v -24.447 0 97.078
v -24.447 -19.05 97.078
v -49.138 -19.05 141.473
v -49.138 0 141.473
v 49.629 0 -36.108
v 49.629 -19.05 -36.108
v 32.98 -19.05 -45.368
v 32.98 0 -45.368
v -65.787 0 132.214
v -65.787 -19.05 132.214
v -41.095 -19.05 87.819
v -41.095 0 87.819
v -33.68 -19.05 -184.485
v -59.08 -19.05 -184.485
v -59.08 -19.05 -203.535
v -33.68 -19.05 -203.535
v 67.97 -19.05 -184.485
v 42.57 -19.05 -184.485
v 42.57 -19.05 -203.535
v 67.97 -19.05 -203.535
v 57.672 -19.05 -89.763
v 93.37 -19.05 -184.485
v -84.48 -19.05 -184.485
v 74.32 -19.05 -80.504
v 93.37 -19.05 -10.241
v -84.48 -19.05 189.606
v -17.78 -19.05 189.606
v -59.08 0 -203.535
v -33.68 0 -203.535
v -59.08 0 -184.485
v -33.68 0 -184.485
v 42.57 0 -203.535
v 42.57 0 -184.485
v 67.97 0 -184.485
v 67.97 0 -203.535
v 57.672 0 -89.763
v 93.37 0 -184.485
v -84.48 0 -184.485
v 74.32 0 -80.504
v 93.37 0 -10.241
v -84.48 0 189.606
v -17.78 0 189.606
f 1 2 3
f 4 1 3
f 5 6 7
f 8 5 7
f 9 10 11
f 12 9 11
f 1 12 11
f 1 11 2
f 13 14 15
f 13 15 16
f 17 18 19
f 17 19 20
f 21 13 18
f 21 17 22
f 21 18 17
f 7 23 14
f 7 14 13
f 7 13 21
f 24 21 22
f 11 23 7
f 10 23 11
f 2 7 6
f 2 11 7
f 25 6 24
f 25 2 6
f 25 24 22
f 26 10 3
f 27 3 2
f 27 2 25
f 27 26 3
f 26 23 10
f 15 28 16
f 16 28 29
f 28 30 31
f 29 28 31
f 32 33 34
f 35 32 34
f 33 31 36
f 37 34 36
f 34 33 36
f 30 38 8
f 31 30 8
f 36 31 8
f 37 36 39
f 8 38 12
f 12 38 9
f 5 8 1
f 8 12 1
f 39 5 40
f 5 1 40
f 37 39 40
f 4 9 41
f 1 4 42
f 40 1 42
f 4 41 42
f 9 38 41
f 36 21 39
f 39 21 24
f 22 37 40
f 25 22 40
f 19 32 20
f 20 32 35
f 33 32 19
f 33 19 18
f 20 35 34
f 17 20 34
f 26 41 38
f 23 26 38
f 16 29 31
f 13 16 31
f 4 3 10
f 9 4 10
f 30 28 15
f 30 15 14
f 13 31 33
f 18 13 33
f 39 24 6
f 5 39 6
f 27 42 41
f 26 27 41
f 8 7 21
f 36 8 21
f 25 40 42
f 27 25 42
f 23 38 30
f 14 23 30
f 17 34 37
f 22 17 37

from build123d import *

# Parameters (mm, degrees)
F0_W     = 25.4
F0_H     = 19.05
F1_DEPTH = 19.05
F3_DEPTH = 19.051


with BuildPart() as f1:
    # F0 (on Front) → F1 (new body)
    with BuildSketch(Plane.XZ):
        Polygon((93.3704, -10.24128), (-17.78, 189.60592), (-84.4804, 189.60592), (-84.4804, -184.48528), (-59.0804, -184.48528), (-33.6804, -184.48528), (42.5704, -184.48528), (67.9704, -184.48528), (93.3704, -184.48528), align=None)
        with Locations((55.2704, -194.01028)):
            Rectangle(F0_W, F0_H)
        with Locations((-46.3804, -194.01028)):
            Rectangle(F0_W, F0_H)
    extrude(amount=F1_DEPTH)

    # F2 (on face) → F3 (cut, through all)
    with BuildSketch(Plane.XZ.offset(19.05)):
        Polygon((-24.446551, 97.077993), (-49.138289, 141.473467), (-65.786592, 132.214065), (-41.094854, 87.818592), align=None)
        Polygon((49.628662, -36.108428), (32.98036, -45.367829), (57.672097, -89.763303), (74.3204, -80.503901), align=None)
    extrude(amount=-F3_DEPTH, mode=Mode.SUBTRACT)


solid = f1.part
